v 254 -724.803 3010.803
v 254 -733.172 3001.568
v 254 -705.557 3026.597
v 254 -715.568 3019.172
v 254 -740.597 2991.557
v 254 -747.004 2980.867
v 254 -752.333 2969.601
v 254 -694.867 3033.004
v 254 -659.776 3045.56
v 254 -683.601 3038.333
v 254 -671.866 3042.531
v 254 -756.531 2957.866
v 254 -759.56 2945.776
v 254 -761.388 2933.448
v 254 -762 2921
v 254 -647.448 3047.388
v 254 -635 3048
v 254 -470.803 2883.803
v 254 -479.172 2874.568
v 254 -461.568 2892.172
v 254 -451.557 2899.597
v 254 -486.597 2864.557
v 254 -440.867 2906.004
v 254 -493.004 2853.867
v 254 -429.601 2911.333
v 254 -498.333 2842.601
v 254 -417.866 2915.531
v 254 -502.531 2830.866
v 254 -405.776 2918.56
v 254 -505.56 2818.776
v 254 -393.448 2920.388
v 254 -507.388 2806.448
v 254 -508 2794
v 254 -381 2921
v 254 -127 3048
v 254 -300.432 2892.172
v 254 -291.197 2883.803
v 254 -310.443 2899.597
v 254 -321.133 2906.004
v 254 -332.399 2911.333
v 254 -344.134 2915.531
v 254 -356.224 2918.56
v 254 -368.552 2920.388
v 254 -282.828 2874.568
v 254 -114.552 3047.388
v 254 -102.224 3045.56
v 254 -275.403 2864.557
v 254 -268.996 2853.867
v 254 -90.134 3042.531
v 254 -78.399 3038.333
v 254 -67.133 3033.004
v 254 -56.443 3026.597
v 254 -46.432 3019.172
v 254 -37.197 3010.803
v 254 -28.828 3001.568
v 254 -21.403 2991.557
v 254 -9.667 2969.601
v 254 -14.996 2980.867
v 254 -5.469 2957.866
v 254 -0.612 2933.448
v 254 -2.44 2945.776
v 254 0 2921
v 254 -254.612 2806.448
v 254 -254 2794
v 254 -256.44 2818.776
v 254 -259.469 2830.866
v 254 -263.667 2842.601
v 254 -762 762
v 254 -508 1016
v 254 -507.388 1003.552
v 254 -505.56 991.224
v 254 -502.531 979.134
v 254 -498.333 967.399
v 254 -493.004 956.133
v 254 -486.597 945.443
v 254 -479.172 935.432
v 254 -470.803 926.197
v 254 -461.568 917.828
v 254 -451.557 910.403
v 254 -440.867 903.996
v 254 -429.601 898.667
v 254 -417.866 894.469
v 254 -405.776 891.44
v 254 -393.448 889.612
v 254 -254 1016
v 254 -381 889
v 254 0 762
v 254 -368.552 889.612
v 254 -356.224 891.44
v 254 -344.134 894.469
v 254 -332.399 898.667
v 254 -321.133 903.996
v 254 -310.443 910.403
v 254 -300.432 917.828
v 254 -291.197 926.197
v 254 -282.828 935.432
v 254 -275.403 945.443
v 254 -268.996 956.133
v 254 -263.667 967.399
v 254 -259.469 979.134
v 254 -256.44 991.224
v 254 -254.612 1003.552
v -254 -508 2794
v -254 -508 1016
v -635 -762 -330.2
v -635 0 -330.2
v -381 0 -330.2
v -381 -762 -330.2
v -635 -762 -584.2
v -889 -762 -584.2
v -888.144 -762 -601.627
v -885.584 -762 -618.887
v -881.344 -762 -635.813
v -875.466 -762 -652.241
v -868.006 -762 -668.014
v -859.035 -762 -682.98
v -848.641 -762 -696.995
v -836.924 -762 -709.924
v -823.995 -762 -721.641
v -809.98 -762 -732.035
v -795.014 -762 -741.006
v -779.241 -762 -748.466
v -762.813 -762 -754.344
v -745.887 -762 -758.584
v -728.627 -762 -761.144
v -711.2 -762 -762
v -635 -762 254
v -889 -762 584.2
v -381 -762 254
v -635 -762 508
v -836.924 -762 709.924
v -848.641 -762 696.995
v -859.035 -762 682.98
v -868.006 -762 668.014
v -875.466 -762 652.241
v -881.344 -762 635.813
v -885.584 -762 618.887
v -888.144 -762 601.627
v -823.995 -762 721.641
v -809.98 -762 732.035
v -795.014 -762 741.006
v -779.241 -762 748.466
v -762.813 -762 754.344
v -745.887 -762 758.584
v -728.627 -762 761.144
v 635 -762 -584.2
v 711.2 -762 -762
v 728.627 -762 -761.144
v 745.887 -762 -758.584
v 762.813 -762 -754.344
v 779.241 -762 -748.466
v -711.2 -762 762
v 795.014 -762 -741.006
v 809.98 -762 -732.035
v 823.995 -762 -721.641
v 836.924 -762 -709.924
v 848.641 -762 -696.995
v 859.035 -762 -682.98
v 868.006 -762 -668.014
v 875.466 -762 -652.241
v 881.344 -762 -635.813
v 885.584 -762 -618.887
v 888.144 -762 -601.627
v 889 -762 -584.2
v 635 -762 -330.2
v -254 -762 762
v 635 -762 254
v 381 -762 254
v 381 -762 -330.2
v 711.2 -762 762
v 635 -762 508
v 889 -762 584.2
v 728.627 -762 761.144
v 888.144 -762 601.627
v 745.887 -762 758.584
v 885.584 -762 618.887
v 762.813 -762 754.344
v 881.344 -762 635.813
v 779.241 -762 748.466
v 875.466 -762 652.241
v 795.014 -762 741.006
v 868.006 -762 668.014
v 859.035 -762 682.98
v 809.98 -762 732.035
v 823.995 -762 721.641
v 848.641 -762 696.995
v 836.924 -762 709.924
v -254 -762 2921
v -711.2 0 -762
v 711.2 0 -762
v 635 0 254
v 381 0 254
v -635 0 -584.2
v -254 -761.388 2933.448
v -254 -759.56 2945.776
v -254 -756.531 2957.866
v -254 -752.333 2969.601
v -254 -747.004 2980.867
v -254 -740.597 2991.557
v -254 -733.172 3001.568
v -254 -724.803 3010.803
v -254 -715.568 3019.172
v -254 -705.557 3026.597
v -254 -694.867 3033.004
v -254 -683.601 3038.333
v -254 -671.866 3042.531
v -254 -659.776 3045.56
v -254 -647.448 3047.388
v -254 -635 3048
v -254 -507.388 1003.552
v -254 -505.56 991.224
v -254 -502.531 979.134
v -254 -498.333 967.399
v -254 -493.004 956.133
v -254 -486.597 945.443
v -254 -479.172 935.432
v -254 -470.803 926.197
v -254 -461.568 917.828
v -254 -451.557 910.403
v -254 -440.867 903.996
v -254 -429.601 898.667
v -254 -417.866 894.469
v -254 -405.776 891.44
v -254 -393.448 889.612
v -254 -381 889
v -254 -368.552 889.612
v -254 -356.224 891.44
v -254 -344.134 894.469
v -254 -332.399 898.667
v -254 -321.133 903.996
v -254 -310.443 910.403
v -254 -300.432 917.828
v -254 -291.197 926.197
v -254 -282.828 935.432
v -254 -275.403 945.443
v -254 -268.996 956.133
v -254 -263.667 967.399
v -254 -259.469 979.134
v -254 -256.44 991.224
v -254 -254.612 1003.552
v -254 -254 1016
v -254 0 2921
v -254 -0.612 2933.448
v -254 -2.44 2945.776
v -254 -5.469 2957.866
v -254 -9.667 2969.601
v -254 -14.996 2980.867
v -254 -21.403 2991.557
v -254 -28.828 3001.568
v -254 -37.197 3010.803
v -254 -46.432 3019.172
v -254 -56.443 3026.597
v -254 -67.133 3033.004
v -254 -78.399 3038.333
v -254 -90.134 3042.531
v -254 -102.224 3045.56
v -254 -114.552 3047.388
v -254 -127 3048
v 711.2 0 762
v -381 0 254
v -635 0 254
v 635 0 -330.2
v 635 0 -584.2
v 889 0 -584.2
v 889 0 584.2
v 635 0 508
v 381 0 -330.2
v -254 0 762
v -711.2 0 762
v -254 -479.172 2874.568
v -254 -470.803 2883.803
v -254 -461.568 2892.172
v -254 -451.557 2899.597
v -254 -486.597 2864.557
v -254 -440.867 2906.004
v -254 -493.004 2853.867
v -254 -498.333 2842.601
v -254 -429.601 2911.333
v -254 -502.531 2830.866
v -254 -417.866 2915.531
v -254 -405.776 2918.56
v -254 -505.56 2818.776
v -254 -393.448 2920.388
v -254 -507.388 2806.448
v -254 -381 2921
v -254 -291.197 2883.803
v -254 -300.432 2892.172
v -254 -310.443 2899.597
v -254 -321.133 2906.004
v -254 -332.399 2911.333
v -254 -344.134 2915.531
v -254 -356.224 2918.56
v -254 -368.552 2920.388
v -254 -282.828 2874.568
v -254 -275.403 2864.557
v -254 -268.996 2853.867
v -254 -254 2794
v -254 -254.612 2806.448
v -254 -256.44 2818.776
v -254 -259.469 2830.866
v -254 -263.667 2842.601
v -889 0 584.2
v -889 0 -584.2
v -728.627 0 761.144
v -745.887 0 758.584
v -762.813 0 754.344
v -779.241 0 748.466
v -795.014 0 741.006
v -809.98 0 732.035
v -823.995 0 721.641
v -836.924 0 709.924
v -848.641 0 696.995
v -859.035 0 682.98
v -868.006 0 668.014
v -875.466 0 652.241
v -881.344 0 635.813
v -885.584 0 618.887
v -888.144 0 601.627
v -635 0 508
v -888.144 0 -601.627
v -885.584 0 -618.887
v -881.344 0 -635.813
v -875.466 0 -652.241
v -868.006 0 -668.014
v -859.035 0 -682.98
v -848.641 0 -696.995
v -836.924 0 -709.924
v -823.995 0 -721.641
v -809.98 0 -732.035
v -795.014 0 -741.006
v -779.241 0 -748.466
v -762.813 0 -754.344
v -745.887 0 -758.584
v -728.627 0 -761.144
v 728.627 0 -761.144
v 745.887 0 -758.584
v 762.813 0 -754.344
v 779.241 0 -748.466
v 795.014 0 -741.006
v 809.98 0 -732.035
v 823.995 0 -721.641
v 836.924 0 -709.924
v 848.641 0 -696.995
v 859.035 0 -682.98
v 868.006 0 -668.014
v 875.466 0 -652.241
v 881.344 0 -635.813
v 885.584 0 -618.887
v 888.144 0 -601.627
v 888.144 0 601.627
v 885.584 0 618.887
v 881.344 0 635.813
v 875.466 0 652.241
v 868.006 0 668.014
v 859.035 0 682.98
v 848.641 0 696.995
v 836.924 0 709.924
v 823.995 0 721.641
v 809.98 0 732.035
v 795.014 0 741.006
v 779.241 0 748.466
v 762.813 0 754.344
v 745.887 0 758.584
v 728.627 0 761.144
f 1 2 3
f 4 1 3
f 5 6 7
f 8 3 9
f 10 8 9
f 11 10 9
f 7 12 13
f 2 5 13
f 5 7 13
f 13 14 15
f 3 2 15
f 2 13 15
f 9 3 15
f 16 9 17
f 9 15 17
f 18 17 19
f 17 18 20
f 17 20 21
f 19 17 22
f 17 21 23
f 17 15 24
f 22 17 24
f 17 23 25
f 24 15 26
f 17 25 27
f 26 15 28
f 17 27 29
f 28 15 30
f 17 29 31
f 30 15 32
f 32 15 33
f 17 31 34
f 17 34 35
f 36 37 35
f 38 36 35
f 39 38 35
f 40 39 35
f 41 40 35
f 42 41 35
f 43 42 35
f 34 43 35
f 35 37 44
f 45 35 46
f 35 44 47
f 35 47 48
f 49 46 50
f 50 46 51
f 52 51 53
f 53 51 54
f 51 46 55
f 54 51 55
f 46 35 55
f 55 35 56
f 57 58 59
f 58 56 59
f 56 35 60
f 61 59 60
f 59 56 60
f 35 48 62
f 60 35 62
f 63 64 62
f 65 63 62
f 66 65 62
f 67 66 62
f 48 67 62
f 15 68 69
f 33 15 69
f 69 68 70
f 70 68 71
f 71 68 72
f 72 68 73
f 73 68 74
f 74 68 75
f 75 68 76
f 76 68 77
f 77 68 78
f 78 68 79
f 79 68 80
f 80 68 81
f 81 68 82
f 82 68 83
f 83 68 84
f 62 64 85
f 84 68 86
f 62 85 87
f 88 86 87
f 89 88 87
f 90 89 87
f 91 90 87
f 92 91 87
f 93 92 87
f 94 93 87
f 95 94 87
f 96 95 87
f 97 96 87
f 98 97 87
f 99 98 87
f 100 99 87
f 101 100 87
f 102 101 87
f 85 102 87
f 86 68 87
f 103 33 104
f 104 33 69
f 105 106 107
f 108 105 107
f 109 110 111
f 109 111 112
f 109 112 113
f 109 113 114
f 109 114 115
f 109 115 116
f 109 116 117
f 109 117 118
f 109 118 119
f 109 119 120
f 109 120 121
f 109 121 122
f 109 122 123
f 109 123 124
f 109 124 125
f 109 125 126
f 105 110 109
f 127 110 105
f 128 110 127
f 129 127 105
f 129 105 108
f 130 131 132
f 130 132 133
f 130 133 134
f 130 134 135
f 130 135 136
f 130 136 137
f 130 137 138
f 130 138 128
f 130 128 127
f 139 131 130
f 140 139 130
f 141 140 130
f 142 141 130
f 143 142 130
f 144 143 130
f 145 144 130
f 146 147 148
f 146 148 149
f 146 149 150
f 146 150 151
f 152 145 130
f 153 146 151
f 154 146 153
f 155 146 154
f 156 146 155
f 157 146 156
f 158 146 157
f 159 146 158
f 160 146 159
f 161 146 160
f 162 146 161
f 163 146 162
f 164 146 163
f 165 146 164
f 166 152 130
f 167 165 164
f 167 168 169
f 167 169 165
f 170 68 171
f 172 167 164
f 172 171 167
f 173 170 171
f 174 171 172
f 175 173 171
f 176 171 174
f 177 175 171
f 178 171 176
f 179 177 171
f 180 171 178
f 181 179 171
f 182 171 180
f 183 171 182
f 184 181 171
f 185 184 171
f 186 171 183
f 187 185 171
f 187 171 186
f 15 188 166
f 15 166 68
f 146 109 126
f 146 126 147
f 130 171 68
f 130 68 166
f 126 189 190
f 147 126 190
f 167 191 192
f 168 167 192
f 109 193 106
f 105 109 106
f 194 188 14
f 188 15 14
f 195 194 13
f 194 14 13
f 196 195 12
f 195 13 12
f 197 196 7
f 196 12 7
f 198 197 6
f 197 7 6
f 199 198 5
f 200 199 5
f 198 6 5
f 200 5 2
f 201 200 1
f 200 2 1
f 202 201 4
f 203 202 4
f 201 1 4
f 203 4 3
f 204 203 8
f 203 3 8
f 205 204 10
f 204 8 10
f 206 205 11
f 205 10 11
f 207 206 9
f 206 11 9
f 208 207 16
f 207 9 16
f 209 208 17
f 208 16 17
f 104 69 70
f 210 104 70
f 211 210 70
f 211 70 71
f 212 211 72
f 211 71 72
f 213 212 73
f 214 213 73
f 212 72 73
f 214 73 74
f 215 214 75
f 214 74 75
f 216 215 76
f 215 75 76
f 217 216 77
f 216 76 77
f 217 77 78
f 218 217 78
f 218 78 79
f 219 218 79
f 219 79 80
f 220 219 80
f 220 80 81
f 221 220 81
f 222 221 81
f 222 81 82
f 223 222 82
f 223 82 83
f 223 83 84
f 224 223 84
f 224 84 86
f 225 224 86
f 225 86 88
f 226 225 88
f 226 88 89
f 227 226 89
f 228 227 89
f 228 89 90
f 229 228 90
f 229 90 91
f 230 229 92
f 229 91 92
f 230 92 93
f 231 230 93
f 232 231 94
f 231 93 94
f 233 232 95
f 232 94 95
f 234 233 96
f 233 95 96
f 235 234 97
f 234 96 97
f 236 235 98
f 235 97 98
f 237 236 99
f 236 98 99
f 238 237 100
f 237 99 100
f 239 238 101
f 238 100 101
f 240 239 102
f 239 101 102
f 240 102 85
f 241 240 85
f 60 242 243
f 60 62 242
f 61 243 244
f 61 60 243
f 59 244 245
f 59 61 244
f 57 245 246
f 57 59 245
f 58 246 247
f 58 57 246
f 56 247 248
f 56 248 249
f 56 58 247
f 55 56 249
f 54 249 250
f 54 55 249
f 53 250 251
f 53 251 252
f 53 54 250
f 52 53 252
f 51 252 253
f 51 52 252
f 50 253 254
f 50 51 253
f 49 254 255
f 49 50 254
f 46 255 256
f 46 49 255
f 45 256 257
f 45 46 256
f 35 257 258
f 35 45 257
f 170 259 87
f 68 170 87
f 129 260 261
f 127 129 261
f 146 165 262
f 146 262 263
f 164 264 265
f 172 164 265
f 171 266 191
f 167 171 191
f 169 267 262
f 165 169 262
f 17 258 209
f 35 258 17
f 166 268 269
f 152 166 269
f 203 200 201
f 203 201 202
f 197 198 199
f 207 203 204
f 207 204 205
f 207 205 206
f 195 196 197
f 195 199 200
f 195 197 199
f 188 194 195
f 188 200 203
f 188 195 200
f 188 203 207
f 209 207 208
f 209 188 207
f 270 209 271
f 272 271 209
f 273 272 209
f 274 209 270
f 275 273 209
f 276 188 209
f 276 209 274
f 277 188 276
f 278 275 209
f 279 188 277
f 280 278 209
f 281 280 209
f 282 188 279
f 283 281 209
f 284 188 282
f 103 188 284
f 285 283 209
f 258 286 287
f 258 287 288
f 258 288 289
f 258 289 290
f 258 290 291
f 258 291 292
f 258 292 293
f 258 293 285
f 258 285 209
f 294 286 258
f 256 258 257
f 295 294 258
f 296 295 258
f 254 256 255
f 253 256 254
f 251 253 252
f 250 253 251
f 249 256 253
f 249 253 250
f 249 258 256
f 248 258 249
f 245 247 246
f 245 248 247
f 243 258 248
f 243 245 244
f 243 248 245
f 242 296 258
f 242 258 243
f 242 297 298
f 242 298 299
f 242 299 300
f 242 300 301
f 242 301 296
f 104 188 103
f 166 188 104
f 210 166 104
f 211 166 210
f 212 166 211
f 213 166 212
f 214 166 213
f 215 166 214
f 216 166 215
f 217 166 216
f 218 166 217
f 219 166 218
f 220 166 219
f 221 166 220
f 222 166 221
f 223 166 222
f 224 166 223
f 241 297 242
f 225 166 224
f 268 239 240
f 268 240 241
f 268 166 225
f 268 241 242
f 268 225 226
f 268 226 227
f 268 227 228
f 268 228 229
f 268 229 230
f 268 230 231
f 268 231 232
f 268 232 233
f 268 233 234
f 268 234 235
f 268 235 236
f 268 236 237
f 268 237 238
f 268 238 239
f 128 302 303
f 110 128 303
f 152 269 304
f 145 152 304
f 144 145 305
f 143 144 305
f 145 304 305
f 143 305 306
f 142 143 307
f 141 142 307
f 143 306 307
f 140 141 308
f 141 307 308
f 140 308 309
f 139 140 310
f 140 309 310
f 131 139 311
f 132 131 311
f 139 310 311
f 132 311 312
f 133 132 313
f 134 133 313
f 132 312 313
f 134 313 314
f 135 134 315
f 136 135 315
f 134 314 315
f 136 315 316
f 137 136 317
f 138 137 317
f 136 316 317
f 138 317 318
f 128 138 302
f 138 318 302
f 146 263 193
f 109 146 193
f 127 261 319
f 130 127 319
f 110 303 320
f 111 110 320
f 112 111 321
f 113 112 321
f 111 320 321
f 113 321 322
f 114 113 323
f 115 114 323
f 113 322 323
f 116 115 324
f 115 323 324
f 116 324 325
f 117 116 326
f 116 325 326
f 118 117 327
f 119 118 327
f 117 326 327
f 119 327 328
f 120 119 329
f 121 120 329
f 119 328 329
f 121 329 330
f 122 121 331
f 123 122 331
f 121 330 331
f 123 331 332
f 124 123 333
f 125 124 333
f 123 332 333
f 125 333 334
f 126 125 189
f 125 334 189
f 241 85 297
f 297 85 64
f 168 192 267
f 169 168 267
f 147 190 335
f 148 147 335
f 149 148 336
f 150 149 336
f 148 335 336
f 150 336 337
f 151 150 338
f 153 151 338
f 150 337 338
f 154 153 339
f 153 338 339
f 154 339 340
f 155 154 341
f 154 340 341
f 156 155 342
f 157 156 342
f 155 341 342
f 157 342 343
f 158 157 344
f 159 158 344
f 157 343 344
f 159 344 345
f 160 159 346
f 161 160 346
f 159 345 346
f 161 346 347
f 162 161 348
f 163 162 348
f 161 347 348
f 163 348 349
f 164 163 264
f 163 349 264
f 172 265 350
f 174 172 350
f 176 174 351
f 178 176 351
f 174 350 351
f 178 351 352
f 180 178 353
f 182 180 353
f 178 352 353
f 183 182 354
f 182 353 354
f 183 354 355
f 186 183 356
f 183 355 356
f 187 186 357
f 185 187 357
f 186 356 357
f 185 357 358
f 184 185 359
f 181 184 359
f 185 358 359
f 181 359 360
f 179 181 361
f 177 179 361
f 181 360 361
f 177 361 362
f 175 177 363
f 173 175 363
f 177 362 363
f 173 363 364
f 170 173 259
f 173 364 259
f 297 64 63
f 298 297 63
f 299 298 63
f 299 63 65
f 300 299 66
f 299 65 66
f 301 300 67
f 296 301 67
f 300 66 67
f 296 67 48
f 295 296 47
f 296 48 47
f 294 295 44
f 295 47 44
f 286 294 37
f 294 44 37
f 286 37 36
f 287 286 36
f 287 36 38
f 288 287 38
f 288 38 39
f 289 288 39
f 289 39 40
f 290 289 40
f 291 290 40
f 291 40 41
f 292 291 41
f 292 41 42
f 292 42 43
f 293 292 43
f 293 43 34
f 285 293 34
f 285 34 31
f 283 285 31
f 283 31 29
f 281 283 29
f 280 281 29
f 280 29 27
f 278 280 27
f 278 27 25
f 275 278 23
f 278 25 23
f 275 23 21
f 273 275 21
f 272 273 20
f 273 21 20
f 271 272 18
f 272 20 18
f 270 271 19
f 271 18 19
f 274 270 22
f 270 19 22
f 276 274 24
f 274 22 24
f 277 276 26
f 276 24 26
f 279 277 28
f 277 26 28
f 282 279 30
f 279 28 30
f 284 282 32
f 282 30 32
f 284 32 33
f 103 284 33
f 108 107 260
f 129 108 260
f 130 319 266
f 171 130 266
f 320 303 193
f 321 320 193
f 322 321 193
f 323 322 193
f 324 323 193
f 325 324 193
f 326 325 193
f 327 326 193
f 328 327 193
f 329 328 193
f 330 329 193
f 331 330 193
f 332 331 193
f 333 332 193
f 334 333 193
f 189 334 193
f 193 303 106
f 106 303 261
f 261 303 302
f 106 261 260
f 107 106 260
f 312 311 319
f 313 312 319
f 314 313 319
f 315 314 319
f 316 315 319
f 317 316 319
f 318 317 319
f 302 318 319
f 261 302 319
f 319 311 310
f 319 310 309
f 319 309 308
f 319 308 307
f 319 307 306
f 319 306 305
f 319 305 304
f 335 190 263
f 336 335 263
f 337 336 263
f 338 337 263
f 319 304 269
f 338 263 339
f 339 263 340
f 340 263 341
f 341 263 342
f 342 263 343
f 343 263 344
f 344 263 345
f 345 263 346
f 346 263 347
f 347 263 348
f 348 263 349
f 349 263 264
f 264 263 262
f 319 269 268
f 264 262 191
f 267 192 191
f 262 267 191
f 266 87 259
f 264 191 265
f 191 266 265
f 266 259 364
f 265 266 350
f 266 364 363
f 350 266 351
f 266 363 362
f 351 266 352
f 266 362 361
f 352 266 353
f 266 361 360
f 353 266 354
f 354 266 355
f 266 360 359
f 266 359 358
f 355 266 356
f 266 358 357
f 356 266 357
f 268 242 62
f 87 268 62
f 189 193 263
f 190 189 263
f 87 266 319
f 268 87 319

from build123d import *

# Parameters (mm, degrees)
F1_DEPTH = 762
F2_W     = 508
F2_H     = 762
F3_DEPTH = 2286
F4_R     = 127
F6_DEPTH = 1648.46


with BuildPart() as f1:
    # F0 (on Front) → F1 (new body)
    with BuildSketch(Plane.XZ):
        with BuildLine():
            Line((711.2, 762), (-711.2, 762))
            ThreePointArc((-711.2, 762), (-836.923585695, 709.923585695), (-889, 584.2))
            Line((-889, 584.2), (-889, -584.2))
            ThreePointArc((-889, -584.2), (-836.923585695, -709.923585695), (-711.2, -762))
            Line((-711.2, -762), (711.2, -762))
            ThreePointArc((711.2, -762), (836.923585695, -709.923585695), (889, -584.2))
            Line((889, -584.2), (889, 584.2))
            ThreePointArc((889, 584.2), (836.923585695, 709.923585695), (711.2, 762))
        make_face()
        Polygon((635, -584.2), (-635, -584.2), (-635, -330.2), (-381, -330.2), (-381, 177.8), (-381, 254), (-635, 254), (-635, 508), (635, 508), (635, 254), (381, 254), (381, 177.8), (381, -330.2), (635, -330.2), align=None, mode=Mode.SUBTRACT)
    extrude(amount=F1_DEPTH)

    # F2 (on face) → F3 (join)
    with BuildSketch(Plane.XY.offset(762)):
        with Locations((0, -381)):
            Rectangle(F2_W, F2_H)
    extrude(amount=F3_DEPTH)

    # F4
    f4_edges = [f1.edges().sort_by_distance(p)[0] for p in [
        (0, -762, 3048),
        (0, 0, 3048),
    ]]
    fillet(f4_edges, radius=F4_R)


with BuildPart() as f6:
    # F5 (on face) → F6 (new body)
    with BuildSketch(Plane.YZ.offset(254)):
        with BuildLine():
            Line((-254, 1016), (-254, 2794))
            ThreePointArc((-254, 2794), (-381, 2921), (-508, 2794))
            Line((-508, 2794), (-508, 1016))
            ThreePointArc((-508, 1016), (-381, 889), (-254, 1016))
        make_face()
    extrude(amount=-F6_DEPTH)


with BuildPart() as f1_1:
    add(f1.part)

    # F7: cut F6
    add(f6.part, mode=Mode.SUBTRACT)


solid = f1_1.part
